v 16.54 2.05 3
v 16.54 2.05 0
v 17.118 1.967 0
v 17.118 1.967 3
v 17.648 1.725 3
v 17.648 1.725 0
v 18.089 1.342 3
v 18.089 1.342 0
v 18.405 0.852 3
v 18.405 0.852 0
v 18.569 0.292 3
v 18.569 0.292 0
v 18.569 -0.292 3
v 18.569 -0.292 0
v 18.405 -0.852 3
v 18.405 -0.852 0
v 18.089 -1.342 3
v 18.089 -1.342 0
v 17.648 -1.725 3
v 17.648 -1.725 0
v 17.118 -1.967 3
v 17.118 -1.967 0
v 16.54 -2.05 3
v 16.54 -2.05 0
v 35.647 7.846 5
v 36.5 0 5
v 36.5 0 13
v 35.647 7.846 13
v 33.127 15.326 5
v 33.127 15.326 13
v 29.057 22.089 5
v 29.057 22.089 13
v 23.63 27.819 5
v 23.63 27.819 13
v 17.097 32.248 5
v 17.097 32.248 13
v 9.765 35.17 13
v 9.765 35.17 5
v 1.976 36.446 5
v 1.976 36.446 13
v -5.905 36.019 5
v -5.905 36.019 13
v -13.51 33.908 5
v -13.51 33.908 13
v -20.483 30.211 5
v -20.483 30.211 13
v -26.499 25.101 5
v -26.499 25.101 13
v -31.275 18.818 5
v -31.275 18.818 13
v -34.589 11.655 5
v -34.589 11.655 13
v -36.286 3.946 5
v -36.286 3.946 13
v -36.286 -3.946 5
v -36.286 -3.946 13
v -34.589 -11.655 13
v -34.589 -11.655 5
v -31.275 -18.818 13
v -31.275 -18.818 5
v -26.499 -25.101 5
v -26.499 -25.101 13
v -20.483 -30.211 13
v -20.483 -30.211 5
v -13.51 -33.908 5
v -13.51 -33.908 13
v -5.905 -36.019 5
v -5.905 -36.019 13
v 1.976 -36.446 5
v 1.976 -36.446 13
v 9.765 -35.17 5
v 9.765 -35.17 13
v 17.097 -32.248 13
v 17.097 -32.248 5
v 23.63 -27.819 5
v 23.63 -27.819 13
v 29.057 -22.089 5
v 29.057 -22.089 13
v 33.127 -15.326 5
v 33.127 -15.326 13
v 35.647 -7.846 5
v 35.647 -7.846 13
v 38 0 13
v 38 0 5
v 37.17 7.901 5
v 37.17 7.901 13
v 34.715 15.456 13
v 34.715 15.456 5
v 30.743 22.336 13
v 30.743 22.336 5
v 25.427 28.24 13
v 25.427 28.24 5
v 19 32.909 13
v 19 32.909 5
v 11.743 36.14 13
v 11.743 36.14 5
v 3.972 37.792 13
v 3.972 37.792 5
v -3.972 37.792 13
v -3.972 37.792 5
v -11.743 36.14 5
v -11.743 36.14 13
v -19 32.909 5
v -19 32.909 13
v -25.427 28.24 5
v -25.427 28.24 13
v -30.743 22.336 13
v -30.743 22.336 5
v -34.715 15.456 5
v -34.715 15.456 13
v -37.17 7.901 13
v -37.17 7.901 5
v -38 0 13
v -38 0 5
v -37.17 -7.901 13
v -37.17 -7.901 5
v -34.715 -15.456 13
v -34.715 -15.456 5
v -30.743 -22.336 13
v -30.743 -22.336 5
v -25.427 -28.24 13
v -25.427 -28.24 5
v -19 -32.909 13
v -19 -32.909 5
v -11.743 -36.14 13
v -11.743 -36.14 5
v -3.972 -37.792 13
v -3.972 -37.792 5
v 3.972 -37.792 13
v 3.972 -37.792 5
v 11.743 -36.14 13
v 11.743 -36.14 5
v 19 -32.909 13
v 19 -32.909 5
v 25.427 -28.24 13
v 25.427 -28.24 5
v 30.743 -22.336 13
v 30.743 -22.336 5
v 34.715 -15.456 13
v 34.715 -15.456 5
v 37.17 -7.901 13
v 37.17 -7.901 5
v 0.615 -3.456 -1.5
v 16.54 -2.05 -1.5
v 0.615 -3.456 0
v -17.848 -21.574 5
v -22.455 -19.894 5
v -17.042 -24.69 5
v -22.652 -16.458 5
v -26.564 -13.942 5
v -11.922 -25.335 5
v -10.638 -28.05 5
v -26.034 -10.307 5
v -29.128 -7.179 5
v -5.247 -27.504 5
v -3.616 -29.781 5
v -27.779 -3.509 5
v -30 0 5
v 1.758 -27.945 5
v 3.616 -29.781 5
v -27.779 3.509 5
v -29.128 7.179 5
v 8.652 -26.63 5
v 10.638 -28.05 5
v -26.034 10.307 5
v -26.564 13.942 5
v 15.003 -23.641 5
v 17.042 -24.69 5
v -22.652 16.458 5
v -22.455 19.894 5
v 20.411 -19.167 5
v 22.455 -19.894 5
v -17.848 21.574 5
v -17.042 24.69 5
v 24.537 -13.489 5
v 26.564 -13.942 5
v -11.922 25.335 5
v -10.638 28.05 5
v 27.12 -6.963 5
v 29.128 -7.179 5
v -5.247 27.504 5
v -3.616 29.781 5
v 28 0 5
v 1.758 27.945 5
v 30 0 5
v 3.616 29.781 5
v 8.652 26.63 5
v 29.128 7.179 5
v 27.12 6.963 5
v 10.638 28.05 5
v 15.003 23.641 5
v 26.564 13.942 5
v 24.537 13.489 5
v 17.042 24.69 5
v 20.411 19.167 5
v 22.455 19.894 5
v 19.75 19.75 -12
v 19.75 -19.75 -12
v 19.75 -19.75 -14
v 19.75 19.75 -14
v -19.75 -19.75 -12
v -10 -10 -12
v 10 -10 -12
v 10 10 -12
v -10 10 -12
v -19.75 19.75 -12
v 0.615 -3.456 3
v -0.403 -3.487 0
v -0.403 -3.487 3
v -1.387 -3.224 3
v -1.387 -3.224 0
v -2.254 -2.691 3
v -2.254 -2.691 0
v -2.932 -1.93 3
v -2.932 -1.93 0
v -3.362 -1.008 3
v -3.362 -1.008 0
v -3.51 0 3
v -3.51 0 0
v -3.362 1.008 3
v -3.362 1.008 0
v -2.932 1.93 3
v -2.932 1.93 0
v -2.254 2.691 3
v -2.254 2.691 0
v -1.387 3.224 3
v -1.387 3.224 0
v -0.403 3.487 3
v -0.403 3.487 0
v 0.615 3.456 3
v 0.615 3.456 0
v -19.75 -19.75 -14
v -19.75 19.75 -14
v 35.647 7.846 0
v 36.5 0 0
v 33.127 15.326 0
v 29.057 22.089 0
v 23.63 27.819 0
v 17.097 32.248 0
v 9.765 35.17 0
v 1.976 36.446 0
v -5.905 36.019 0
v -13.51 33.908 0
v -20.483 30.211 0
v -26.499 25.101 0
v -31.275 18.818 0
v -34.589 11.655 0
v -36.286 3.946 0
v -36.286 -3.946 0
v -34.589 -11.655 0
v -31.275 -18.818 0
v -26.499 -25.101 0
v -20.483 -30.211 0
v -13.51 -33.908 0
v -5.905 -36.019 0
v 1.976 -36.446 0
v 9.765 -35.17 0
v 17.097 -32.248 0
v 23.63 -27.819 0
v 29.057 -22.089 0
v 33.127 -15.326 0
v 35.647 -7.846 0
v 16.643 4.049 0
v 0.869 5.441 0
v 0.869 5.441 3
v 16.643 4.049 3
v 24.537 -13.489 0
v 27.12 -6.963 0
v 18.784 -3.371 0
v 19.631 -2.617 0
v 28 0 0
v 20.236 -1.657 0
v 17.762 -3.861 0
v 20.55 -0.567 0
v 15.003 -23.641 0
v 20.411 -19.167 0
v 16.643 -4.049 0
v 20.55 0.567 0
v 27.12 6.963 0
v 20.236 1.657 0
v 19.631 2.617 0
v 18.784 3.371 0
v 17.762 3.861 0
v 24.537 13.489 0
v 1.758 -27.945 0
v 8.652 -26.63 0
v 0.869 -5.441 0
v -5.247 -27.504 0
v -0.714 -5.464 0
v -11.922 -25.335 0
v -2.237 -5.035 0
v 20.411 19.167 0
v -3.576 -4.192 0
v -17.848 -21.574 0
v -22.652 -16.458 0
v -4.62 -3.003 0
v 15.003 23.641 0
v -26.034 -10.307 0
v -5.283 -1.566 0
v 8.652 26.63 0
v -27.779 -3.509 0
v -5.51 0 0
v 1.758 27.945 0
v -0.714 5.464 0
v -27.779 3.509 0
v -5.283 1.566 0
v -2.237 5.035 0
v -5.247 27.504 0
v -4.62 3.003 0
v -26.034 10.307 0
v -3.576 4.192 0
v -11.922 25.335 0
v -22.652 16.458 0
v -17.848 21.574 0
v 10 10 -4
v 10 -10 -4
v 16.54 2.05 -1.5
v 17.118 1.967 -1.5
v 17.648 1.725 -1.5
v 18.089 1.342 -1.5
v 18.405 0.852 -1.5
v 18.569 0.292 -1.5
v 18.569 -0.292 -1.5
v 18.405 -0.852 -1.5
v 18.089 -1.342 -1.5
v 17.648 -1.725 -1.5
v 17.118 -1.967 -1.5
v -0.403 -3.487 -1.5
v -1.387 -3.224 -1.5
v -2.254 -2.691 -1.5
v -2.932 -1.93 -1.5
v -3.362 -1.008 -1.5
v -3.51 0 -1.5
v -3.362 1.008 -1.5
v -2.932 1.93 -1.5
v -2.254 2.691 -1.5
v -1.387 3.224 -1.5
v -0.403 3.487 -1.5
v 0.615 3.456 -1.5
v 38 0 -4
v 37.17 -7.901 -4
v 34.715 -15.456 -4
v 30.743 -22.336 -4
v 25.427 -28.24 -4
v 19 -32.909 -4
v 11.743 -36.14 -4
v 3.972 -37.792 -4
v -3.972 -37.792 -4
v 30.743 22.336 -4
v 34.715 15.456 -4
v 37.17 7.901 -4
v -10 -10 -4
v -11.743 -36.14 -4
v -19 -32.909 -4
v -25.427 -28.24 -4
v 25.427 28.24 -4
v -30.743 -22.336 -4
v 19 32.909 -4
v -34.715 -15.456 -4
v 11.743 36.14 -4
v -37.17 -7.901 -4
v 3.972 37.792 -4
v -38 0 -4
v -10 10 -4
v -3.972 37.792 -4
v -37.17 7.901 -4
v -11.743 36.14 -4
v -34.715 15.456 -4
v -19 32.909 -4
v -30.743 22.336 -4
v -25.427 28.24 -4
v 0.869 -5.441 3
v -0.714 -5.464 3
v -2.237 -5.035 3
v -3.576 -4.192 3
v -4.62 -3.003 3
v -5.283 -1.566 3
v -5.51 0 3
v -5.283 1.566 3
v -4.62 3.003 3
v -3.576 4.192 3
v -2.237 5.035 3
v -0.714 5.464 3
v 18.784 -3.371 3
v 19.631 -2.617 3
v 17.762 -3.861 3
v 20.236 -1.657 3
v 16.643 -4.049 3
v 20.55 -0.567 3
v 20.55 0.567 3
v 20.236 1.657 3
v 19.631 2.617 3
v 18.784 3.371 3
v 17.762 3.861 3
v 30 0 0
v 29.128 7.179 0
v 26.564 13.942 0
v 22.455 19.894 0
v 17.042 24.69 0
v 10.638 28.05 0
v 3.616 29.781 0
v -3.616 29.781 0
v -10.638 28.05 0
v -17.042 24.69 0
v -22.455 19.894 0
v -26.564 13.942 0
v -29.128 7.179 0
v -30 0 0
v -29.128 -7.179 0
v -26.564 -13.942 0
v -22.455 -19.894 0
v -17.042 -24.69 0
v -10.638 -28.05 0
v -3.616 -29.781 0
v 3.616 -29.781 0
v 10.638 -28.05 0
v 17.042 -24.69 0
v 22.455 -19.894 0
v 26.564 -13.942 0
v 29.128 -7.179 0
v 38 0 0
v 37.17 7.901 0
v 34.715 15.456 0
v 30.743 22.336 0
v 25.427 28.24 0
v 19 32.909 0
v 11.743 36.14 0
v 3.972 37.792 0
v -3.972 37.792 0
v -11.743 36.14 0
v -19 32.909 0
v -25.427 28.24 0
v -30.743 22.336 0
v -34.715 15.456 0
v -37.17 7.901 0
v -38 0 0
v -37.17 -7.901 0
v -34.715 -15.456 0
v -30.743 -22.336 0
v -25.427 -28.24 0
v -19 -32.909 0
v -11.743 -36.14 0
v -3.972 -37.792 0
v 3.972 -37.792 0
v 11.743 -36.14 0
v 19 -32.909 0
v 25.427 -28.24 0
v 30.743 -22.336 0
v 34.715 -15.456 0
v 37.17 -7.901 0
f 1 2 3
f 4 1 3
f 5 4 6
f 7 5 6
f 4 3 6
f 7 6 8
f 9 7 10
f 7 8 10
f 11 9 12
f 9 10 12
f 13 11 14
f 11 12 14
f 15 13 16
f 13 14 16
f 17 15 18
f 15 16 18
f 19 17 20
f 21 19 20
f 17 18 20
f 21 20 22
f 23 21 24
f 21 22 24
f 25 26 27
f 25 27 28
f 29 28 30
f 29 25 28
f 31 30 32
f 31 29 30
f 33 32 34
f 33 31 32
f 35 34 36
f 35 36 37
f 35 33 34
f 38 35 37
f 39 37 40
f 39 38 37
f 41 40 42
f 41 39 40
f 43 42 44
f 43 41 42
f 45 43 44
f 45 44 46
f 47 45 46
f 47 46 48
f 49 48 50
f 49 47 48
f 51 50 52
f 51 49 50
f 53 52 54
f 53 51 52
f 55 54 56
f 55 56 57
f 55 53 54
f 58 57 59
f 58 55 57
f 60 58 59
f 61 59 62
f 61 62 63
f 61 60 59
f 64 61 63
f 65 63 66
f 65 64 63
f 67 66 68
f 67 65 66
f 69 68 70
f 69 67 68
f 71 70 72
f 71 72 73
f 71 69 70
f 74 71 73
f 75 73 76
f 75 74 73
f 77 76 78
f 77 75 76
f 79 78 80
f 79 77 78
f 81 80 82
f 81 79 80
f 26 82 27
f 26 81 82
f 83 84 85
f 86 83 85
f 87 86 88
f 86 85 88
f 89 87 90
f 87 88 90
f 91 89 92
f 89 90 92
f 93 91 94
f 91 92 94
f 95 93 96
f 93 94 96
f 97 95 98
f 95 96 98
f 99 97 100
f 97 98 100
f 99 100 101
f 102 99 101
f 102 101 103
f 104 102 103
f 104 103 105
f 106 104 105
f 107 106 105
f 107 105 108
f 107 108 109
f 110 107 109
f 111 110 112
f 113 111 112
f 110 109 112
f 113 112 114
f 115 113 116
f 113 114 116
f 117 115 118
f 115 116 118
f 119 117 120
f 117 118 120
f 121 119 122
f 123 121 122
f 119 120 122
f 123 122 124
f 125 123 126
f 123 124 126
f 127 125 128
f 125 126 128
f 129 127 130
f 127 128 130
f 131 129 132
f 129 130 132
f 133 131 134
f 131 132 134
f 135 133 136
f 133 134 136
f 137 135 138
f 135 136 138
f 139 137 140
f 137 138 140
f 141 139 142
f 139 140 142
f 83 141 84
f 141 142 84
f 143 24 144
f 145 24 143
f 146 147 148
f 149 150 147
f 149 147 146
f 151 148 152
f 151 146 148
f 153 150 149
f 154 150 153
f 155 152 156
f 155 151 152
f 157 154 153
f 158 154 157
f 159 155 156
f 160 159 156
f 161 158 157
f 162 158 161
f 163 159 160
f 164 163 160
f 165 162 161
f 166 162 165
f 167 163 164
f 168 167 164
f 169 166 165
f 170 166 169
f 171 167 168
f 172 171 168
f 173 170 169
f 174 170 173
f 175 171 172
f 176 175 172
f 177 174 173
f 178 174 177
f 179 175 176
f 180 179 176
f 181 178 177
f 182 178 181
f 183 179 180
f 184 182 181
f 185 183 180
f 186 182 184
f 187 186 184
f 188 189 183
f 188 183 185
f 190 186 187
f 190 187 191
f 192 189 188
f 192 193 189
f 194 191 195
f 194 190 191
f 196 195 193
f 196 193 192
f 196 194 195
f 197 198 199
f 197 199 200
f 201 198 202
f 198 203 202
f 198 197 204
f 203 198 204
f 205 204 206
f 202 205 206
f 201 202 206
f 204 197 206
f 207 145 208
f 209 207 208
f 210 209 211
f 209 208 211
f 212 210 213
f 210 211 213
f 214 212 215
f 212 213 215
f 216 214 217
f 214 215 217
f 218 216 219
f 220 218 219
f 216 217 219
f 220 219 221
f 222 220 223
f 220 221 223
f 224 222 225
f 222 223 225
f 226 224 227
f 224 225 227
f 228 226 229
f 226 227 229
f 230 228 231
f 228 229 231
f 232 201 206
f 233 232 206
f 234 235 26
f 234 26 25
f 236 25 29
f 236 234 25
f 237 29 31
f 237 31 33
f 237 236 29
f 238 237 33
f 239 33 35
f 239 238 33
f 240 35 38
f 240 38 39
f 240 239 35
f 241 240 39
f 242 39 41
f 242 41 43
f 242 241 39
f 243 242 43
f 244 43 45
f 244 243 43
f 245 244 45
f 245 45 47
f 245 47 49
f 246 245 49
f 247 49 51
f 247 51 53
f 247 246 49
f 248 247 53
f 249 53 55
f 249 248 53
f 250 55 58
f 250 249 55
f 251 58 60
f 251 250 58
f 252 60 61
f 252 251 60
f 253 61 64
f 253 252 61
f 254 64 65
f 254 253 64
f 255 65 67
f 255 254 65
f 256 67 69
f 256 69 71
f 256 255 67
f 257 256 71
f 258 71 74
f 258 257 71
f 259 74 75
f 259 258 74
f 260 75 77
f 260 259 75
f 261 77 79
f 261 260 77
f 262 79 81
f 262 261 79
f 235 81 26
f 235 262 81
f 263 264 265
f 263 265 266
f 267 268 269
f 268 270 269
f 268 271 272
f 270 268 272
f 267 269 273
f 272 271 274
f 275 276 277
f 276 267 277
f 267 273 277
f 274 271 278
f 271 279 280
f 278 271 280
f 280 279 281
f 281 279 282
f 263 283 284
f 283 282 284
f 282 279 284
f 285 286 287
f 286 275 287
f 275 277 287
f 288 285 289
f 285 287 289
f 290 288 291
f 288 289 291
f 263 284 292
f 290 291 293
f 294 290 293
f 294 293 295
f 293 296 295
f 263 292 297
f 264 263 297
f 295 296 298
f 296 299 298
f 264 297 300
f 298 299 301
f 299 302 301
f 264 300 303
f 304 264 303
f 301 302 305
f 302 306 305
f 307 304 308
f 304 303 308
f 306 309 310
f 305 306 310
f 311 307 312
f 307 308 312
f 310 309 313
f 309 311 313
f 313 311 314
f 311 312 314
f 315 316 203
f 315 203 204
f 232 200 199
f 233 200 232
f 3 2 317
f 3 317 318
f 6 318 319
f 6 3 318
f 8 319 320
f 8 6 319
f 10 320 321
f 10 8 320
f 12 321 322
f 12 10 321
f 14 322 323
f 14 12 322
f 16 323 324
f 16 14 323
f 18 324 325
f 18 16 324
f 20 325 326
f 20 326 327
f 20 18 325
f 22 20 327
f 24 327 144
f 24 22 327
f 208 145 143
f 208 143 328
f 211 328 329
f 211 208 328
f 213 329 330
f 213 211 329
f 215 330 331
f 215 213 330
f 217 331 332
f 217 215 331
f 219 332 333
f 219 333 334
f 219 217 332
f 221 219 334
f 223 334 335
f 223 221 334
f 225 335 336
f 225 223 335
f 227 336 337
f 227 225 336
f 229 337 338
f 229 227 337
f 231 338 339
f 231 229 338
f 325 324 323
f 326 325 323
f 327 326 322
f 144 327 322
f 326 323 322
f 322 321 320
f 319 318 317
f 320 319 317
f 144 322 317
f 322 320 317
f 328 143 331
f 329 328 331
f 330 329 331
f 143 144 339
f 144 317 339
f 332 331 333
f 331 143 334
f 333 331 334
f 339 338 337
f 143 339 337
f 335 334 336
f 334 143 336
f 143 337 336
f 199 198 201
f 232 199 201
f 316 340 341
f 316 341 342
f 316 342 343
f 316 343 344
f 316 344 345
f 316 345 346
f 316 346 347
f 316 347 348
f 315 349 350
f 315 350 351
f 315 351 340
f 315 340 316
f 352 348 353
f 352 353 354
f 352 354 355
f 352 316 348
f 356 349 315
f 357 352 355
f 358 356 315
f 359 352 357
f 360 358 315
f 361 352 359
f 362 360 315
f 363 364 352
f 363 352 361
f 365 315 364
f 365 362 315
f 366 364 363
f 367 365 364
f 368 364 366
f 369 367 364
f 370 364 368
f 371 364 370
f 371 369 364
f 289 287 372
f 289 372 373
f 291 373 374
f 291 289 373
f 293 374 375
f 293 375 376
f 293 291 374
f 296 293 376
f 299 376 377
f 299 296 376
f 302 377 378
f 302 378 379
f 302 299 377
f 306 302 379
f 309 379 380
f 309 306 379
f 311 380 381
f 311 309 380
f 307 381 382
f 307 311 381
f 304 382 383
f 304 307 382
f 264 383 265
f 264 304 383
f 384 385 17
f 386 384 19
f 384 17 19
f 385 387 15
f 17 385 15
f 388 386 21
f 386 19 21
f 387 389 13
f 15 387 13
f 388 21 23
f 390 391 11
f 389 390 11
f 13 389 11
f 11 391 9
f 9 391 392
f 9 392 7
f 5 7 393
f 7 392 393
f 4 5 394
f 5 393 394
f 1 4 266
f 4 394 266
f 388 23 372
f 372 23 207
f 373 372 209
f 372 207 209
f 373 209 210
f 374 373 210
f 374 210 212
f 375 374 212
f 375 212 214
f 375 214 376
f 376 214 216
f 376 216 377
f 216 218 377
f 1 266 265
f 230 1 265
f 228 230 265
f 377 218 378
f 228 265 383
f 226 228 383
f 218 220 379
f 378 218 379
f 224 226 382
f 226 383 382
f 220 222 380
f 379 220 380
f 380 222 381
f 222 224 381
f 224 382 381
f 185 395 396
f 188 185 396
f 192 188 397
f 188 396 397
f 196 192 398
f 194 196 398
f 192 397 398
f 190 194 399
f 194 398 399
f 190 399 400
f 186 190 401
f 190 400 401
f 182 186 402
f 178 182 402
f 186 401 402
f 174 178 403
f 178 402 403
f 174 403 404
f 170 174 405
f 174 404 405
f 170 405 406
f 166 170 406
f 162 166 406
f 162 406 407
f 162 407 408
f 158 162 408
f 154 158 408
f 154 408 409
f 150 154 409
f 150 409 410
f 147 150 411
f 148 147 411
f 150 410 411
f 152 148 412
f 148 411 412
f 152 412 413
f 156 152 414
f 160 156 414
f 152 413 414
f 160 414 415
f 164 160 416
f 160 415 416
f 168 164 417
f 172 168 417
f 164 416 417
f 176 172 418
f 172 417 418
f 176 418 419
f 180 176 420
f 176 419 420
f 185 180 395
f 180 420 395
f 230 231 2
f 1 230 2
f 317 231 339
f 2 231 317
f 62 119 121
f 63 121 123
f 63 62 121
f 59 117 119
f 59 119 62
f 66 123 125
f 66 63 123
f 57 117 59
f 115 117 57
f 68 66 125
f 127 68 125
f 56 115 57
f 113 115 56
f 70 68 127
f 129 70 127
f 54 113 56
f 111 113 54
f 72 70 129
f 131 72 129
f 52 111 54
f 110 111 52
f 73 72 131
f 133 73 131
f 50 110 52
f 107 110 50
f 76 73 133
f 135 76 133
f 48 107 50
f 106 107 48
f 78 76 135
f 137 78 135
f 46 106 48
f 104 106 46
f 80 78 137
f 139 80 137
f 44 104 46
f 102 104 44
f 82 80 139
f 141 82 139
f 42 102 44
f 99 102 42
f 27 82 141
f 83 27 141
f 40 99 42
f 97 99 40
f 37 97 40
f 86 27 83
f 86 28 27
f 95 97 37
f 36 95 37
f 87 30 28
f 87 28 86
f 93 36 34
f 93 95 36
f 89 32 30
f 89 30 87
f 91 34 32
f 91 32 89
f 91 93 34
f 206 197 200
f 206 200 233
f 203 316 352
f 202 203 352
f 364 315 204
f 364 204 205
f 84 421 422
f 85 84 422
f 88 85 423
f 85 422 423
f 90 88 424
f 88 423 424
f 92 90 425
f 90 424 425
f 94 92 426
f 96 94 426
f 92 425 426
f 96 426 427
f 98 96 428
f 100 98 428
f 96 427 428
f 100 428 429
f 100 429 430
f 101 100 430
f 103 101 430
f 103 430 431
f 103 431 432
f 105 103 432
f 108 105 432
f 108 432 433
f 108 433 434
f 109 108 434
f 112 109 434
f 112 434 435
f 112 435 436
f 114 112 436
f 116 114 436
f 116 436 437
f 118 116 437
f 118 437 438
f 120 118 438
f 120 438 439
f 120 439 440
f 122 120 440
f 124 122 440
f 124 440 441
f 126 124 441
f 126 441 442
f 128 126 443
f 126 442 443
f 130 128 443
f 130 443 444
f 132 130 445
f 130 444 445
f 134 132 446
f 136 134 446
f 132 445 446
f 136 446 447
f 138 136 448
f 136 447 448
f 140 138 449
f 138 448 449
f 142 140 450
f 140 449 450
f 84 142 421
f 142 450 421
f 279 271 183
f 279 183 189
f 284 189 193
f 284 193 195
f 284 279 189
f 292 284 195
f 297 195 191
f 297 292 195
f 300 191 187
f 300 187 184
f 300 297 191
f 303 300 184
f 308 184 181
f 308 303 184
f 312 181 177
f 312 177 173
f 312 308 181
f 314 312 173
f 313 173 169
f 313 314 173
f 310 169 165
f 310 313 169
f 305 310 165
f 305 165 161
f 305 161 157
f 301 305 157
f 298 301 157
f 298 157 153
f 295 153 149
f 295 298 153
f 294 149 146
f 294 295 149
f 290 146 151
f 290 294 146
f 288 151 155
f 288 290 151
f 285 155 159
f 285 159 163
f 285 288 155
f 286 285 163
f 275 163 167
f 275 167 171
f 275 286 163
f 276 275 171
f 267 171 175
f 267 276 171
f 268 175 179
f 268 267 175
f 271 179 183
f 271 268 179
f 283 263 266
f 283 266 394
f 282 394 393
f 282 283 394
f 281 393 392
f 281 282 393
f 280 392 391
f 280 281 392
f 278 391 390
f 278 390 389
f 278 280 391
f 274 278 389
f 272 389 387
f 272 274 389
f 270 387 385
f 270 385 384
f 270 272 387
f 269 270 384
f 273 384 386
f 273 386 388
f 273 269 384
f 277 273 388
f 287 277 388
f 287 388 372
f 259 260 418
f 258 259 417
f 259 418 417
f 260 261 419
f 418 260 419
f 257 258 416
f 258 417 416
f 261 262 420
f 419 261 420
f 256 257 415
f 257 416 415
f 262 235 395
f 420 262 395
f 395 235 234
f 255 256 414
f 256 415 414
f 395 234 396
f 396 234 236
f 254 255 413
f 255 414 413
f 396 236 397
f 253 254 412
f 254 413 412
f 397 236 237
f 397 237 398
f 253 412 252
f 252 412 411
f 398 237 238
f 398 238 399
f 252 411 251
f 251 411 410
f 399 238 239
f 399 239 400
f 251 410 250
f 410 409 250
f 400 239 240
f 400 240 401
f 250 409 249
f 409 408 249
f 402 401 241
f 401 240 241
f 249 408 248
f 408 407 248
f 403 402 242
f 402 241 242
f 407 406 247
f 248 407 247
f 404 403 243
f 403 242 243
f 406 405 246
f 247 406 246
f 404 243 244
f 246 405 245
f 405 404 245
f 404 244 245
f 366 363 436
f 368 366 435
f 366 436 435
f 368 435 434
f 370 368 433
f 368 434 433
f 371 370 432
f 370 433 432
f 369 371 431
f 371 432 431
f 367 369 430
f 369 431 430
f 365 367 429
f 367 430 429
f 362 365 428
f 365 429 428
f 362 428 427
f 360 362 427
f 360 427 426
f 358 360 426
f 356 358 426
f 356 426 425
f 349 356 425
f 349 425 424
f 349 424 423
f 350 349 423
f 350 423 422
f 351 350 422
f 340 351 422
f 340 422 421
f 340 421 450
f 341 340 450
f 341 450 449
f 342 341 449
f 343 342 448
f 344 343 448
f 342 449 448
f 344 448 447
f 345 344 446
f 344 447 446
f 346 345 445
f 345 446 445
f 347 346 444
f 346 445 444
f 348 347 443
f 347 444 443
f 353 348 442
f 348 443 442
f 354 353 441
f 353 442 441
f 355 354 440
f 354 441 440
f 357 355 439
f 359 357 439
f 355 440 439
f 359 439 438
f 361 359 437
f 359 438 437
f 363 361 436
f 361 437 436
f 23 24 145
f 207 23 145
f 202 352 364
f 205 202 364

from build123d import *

# Parameters (mm, degrees)
SKETCH2_R             = 30
SKETCH2_R_2           = 28
BOSS_EXTRUDE1_DEPTH   = 5
SKETCH2_R_3           = 38
SKETCH2_R_4           = 36.5
BOSS_EXTRUDE1_2_DEPTH = 5
SKETCH5_R             = 38
BOSS_EXTRUDE2_DEPTH   = 4
BOSS_EXTRUDE3_DEPTH   = 3
CUT_EXTRUDE1_DEPTH    = 1.5
SKETCH10_R            = 38
SKETCH10_R_2          = 36.5
BOSS_EXTRUDE4_DEPTH   = 8
SKETCH11_W            = 20
SKETCH11_H            = 20
BOSS_EXTRUDE5_DEPTH   = 8
SKETCH12_W            = 39.5
SKETCH12_H            = 39.5
BOSS_EXTRUDE6_DEPTH   = 2


with BuildPart() as part:
    # Sketch2 → Boss-Extrude1 (new body)
    with BuildSketch(Plane.XY):
        Circle(SKETCH2_R)
        Circle(SKETCH2_R_2, mode=Mode.SUBTRACT)
    extrude(amount=BOSS_EXTRUDE1_DEPTH)



with BuildPart() as body_2:
    # Sketch2 → Boss-Extrude1 2 (new body)
    with BuildSketch(Plane.XY):
        Circle(SKETCH2_R_3)
        Circle(SKETCH2_R_4, mode=Mode.SUBTRACT)
    extrude(amount=BOSS_EXTRUDE1_2_DEPTH)


with BuildPart() as part_1:
    add(part.part)

    add(body_2.part)  # Boss-Extrude2 merges body 2
    # Sketch5 → Boss-Extrude2 (add)
    with BuildSketch(Plane(origin=(0, 0, 0), x_dir=(-1, 0, 0), z_dir=(0, 0, -1))):
        Circle(SKETCH5_R)
    extrude(amount=BOSS_EXTRUDE2_DEPTH)

    # Sketch6 → Boss-Extrude3 (add)
    with BuildSketch(Plane.XY):
        with BuildLine():
            Line((0.868619612, 5.441102827), (16.642915533, 4.048692183))
            ThreePointArc((16.642915533, 4.048692183), (20.59, 0), (16.642915533, -4.048692183))
            Line((16.642915533, -4.048692183), (0.868619612, -5.441102827))
            ThreePointArc((0.868619612, -5.441102827), (-5.51, 0), (0.868619612, 5.441102827))
        make_face()
        with BuildLine():
            Line((0.614870513, 3.455724852), (16.54, 2.05))
            ThreePointArc((16.54, 2.05), (18.59, 0), (16.54, -2.05))
            Line((16.54, -2.05), (0.614870513, -3.455724852))
            ThreePointArc((0.614870513, -3.455724852), (-3.51, 0), (0.614870513, 3.455724852))
        make_face(mode=Mode.SUBTRACT)
    extrude(amount=BOSS_EXTRUDE3_DEPTH)

    # Sketch9 → Cut-Extrude1 (cut)
    with BuildSketch(Plane.XY):
        with BuildLine():
            Line((0.614870513, 3.455724852), (16.54, 2.05))
            ThreePointArc((16.54, 2.05), (18.59, 0), (16.54, -2.05))
            Line((16.54, -2.05), (0.614870513, -3.455724852))
            ThreePointArc((0.614870513, -3.455724852), (-3.51, 0), (0.614870513, 3.455724852))
        make_face()
    extrude(amount=-CUT_EXTRUDE1_DEPTH, mode=Mode.SUBTRACT)

    # Sketch10 → Boss-Extrude4 (add)
    with BuildSketch(Plane.XY.offset(5)):
        Circle(SKETCH10_R)
        Circle(SKETCH10_R_2, mode=Mode.SUBTRACT)
    extrude(amount=BOSS_EXTRUDE4_DEPTH)

    # Sketch11 → Boss-Extrude5 (add)
    with BuildSketch(Plane(origin=(0, 0, -4), x_dir=(-1, 0, 0), z_dir=(0, 0, -1))):
        Rectangle(SKETCH11_W, SKETCH11_H)
    extrude(amount=BOSS_EXTRUDE5_DEPTH)

    # Sketch12 → Boss-Extrude6 (add)
    with BuildSketch(Plane(origin=(0, 0, -12), x_dir=(-1, 0, 0), z_dir=(0, 0, -1))):
        Rectangle(SKETCH12_W, SKETCH12_H)
    extrude(amount=BOSS_EXTRUDE6_DEPTH)


solid = part_1.part
